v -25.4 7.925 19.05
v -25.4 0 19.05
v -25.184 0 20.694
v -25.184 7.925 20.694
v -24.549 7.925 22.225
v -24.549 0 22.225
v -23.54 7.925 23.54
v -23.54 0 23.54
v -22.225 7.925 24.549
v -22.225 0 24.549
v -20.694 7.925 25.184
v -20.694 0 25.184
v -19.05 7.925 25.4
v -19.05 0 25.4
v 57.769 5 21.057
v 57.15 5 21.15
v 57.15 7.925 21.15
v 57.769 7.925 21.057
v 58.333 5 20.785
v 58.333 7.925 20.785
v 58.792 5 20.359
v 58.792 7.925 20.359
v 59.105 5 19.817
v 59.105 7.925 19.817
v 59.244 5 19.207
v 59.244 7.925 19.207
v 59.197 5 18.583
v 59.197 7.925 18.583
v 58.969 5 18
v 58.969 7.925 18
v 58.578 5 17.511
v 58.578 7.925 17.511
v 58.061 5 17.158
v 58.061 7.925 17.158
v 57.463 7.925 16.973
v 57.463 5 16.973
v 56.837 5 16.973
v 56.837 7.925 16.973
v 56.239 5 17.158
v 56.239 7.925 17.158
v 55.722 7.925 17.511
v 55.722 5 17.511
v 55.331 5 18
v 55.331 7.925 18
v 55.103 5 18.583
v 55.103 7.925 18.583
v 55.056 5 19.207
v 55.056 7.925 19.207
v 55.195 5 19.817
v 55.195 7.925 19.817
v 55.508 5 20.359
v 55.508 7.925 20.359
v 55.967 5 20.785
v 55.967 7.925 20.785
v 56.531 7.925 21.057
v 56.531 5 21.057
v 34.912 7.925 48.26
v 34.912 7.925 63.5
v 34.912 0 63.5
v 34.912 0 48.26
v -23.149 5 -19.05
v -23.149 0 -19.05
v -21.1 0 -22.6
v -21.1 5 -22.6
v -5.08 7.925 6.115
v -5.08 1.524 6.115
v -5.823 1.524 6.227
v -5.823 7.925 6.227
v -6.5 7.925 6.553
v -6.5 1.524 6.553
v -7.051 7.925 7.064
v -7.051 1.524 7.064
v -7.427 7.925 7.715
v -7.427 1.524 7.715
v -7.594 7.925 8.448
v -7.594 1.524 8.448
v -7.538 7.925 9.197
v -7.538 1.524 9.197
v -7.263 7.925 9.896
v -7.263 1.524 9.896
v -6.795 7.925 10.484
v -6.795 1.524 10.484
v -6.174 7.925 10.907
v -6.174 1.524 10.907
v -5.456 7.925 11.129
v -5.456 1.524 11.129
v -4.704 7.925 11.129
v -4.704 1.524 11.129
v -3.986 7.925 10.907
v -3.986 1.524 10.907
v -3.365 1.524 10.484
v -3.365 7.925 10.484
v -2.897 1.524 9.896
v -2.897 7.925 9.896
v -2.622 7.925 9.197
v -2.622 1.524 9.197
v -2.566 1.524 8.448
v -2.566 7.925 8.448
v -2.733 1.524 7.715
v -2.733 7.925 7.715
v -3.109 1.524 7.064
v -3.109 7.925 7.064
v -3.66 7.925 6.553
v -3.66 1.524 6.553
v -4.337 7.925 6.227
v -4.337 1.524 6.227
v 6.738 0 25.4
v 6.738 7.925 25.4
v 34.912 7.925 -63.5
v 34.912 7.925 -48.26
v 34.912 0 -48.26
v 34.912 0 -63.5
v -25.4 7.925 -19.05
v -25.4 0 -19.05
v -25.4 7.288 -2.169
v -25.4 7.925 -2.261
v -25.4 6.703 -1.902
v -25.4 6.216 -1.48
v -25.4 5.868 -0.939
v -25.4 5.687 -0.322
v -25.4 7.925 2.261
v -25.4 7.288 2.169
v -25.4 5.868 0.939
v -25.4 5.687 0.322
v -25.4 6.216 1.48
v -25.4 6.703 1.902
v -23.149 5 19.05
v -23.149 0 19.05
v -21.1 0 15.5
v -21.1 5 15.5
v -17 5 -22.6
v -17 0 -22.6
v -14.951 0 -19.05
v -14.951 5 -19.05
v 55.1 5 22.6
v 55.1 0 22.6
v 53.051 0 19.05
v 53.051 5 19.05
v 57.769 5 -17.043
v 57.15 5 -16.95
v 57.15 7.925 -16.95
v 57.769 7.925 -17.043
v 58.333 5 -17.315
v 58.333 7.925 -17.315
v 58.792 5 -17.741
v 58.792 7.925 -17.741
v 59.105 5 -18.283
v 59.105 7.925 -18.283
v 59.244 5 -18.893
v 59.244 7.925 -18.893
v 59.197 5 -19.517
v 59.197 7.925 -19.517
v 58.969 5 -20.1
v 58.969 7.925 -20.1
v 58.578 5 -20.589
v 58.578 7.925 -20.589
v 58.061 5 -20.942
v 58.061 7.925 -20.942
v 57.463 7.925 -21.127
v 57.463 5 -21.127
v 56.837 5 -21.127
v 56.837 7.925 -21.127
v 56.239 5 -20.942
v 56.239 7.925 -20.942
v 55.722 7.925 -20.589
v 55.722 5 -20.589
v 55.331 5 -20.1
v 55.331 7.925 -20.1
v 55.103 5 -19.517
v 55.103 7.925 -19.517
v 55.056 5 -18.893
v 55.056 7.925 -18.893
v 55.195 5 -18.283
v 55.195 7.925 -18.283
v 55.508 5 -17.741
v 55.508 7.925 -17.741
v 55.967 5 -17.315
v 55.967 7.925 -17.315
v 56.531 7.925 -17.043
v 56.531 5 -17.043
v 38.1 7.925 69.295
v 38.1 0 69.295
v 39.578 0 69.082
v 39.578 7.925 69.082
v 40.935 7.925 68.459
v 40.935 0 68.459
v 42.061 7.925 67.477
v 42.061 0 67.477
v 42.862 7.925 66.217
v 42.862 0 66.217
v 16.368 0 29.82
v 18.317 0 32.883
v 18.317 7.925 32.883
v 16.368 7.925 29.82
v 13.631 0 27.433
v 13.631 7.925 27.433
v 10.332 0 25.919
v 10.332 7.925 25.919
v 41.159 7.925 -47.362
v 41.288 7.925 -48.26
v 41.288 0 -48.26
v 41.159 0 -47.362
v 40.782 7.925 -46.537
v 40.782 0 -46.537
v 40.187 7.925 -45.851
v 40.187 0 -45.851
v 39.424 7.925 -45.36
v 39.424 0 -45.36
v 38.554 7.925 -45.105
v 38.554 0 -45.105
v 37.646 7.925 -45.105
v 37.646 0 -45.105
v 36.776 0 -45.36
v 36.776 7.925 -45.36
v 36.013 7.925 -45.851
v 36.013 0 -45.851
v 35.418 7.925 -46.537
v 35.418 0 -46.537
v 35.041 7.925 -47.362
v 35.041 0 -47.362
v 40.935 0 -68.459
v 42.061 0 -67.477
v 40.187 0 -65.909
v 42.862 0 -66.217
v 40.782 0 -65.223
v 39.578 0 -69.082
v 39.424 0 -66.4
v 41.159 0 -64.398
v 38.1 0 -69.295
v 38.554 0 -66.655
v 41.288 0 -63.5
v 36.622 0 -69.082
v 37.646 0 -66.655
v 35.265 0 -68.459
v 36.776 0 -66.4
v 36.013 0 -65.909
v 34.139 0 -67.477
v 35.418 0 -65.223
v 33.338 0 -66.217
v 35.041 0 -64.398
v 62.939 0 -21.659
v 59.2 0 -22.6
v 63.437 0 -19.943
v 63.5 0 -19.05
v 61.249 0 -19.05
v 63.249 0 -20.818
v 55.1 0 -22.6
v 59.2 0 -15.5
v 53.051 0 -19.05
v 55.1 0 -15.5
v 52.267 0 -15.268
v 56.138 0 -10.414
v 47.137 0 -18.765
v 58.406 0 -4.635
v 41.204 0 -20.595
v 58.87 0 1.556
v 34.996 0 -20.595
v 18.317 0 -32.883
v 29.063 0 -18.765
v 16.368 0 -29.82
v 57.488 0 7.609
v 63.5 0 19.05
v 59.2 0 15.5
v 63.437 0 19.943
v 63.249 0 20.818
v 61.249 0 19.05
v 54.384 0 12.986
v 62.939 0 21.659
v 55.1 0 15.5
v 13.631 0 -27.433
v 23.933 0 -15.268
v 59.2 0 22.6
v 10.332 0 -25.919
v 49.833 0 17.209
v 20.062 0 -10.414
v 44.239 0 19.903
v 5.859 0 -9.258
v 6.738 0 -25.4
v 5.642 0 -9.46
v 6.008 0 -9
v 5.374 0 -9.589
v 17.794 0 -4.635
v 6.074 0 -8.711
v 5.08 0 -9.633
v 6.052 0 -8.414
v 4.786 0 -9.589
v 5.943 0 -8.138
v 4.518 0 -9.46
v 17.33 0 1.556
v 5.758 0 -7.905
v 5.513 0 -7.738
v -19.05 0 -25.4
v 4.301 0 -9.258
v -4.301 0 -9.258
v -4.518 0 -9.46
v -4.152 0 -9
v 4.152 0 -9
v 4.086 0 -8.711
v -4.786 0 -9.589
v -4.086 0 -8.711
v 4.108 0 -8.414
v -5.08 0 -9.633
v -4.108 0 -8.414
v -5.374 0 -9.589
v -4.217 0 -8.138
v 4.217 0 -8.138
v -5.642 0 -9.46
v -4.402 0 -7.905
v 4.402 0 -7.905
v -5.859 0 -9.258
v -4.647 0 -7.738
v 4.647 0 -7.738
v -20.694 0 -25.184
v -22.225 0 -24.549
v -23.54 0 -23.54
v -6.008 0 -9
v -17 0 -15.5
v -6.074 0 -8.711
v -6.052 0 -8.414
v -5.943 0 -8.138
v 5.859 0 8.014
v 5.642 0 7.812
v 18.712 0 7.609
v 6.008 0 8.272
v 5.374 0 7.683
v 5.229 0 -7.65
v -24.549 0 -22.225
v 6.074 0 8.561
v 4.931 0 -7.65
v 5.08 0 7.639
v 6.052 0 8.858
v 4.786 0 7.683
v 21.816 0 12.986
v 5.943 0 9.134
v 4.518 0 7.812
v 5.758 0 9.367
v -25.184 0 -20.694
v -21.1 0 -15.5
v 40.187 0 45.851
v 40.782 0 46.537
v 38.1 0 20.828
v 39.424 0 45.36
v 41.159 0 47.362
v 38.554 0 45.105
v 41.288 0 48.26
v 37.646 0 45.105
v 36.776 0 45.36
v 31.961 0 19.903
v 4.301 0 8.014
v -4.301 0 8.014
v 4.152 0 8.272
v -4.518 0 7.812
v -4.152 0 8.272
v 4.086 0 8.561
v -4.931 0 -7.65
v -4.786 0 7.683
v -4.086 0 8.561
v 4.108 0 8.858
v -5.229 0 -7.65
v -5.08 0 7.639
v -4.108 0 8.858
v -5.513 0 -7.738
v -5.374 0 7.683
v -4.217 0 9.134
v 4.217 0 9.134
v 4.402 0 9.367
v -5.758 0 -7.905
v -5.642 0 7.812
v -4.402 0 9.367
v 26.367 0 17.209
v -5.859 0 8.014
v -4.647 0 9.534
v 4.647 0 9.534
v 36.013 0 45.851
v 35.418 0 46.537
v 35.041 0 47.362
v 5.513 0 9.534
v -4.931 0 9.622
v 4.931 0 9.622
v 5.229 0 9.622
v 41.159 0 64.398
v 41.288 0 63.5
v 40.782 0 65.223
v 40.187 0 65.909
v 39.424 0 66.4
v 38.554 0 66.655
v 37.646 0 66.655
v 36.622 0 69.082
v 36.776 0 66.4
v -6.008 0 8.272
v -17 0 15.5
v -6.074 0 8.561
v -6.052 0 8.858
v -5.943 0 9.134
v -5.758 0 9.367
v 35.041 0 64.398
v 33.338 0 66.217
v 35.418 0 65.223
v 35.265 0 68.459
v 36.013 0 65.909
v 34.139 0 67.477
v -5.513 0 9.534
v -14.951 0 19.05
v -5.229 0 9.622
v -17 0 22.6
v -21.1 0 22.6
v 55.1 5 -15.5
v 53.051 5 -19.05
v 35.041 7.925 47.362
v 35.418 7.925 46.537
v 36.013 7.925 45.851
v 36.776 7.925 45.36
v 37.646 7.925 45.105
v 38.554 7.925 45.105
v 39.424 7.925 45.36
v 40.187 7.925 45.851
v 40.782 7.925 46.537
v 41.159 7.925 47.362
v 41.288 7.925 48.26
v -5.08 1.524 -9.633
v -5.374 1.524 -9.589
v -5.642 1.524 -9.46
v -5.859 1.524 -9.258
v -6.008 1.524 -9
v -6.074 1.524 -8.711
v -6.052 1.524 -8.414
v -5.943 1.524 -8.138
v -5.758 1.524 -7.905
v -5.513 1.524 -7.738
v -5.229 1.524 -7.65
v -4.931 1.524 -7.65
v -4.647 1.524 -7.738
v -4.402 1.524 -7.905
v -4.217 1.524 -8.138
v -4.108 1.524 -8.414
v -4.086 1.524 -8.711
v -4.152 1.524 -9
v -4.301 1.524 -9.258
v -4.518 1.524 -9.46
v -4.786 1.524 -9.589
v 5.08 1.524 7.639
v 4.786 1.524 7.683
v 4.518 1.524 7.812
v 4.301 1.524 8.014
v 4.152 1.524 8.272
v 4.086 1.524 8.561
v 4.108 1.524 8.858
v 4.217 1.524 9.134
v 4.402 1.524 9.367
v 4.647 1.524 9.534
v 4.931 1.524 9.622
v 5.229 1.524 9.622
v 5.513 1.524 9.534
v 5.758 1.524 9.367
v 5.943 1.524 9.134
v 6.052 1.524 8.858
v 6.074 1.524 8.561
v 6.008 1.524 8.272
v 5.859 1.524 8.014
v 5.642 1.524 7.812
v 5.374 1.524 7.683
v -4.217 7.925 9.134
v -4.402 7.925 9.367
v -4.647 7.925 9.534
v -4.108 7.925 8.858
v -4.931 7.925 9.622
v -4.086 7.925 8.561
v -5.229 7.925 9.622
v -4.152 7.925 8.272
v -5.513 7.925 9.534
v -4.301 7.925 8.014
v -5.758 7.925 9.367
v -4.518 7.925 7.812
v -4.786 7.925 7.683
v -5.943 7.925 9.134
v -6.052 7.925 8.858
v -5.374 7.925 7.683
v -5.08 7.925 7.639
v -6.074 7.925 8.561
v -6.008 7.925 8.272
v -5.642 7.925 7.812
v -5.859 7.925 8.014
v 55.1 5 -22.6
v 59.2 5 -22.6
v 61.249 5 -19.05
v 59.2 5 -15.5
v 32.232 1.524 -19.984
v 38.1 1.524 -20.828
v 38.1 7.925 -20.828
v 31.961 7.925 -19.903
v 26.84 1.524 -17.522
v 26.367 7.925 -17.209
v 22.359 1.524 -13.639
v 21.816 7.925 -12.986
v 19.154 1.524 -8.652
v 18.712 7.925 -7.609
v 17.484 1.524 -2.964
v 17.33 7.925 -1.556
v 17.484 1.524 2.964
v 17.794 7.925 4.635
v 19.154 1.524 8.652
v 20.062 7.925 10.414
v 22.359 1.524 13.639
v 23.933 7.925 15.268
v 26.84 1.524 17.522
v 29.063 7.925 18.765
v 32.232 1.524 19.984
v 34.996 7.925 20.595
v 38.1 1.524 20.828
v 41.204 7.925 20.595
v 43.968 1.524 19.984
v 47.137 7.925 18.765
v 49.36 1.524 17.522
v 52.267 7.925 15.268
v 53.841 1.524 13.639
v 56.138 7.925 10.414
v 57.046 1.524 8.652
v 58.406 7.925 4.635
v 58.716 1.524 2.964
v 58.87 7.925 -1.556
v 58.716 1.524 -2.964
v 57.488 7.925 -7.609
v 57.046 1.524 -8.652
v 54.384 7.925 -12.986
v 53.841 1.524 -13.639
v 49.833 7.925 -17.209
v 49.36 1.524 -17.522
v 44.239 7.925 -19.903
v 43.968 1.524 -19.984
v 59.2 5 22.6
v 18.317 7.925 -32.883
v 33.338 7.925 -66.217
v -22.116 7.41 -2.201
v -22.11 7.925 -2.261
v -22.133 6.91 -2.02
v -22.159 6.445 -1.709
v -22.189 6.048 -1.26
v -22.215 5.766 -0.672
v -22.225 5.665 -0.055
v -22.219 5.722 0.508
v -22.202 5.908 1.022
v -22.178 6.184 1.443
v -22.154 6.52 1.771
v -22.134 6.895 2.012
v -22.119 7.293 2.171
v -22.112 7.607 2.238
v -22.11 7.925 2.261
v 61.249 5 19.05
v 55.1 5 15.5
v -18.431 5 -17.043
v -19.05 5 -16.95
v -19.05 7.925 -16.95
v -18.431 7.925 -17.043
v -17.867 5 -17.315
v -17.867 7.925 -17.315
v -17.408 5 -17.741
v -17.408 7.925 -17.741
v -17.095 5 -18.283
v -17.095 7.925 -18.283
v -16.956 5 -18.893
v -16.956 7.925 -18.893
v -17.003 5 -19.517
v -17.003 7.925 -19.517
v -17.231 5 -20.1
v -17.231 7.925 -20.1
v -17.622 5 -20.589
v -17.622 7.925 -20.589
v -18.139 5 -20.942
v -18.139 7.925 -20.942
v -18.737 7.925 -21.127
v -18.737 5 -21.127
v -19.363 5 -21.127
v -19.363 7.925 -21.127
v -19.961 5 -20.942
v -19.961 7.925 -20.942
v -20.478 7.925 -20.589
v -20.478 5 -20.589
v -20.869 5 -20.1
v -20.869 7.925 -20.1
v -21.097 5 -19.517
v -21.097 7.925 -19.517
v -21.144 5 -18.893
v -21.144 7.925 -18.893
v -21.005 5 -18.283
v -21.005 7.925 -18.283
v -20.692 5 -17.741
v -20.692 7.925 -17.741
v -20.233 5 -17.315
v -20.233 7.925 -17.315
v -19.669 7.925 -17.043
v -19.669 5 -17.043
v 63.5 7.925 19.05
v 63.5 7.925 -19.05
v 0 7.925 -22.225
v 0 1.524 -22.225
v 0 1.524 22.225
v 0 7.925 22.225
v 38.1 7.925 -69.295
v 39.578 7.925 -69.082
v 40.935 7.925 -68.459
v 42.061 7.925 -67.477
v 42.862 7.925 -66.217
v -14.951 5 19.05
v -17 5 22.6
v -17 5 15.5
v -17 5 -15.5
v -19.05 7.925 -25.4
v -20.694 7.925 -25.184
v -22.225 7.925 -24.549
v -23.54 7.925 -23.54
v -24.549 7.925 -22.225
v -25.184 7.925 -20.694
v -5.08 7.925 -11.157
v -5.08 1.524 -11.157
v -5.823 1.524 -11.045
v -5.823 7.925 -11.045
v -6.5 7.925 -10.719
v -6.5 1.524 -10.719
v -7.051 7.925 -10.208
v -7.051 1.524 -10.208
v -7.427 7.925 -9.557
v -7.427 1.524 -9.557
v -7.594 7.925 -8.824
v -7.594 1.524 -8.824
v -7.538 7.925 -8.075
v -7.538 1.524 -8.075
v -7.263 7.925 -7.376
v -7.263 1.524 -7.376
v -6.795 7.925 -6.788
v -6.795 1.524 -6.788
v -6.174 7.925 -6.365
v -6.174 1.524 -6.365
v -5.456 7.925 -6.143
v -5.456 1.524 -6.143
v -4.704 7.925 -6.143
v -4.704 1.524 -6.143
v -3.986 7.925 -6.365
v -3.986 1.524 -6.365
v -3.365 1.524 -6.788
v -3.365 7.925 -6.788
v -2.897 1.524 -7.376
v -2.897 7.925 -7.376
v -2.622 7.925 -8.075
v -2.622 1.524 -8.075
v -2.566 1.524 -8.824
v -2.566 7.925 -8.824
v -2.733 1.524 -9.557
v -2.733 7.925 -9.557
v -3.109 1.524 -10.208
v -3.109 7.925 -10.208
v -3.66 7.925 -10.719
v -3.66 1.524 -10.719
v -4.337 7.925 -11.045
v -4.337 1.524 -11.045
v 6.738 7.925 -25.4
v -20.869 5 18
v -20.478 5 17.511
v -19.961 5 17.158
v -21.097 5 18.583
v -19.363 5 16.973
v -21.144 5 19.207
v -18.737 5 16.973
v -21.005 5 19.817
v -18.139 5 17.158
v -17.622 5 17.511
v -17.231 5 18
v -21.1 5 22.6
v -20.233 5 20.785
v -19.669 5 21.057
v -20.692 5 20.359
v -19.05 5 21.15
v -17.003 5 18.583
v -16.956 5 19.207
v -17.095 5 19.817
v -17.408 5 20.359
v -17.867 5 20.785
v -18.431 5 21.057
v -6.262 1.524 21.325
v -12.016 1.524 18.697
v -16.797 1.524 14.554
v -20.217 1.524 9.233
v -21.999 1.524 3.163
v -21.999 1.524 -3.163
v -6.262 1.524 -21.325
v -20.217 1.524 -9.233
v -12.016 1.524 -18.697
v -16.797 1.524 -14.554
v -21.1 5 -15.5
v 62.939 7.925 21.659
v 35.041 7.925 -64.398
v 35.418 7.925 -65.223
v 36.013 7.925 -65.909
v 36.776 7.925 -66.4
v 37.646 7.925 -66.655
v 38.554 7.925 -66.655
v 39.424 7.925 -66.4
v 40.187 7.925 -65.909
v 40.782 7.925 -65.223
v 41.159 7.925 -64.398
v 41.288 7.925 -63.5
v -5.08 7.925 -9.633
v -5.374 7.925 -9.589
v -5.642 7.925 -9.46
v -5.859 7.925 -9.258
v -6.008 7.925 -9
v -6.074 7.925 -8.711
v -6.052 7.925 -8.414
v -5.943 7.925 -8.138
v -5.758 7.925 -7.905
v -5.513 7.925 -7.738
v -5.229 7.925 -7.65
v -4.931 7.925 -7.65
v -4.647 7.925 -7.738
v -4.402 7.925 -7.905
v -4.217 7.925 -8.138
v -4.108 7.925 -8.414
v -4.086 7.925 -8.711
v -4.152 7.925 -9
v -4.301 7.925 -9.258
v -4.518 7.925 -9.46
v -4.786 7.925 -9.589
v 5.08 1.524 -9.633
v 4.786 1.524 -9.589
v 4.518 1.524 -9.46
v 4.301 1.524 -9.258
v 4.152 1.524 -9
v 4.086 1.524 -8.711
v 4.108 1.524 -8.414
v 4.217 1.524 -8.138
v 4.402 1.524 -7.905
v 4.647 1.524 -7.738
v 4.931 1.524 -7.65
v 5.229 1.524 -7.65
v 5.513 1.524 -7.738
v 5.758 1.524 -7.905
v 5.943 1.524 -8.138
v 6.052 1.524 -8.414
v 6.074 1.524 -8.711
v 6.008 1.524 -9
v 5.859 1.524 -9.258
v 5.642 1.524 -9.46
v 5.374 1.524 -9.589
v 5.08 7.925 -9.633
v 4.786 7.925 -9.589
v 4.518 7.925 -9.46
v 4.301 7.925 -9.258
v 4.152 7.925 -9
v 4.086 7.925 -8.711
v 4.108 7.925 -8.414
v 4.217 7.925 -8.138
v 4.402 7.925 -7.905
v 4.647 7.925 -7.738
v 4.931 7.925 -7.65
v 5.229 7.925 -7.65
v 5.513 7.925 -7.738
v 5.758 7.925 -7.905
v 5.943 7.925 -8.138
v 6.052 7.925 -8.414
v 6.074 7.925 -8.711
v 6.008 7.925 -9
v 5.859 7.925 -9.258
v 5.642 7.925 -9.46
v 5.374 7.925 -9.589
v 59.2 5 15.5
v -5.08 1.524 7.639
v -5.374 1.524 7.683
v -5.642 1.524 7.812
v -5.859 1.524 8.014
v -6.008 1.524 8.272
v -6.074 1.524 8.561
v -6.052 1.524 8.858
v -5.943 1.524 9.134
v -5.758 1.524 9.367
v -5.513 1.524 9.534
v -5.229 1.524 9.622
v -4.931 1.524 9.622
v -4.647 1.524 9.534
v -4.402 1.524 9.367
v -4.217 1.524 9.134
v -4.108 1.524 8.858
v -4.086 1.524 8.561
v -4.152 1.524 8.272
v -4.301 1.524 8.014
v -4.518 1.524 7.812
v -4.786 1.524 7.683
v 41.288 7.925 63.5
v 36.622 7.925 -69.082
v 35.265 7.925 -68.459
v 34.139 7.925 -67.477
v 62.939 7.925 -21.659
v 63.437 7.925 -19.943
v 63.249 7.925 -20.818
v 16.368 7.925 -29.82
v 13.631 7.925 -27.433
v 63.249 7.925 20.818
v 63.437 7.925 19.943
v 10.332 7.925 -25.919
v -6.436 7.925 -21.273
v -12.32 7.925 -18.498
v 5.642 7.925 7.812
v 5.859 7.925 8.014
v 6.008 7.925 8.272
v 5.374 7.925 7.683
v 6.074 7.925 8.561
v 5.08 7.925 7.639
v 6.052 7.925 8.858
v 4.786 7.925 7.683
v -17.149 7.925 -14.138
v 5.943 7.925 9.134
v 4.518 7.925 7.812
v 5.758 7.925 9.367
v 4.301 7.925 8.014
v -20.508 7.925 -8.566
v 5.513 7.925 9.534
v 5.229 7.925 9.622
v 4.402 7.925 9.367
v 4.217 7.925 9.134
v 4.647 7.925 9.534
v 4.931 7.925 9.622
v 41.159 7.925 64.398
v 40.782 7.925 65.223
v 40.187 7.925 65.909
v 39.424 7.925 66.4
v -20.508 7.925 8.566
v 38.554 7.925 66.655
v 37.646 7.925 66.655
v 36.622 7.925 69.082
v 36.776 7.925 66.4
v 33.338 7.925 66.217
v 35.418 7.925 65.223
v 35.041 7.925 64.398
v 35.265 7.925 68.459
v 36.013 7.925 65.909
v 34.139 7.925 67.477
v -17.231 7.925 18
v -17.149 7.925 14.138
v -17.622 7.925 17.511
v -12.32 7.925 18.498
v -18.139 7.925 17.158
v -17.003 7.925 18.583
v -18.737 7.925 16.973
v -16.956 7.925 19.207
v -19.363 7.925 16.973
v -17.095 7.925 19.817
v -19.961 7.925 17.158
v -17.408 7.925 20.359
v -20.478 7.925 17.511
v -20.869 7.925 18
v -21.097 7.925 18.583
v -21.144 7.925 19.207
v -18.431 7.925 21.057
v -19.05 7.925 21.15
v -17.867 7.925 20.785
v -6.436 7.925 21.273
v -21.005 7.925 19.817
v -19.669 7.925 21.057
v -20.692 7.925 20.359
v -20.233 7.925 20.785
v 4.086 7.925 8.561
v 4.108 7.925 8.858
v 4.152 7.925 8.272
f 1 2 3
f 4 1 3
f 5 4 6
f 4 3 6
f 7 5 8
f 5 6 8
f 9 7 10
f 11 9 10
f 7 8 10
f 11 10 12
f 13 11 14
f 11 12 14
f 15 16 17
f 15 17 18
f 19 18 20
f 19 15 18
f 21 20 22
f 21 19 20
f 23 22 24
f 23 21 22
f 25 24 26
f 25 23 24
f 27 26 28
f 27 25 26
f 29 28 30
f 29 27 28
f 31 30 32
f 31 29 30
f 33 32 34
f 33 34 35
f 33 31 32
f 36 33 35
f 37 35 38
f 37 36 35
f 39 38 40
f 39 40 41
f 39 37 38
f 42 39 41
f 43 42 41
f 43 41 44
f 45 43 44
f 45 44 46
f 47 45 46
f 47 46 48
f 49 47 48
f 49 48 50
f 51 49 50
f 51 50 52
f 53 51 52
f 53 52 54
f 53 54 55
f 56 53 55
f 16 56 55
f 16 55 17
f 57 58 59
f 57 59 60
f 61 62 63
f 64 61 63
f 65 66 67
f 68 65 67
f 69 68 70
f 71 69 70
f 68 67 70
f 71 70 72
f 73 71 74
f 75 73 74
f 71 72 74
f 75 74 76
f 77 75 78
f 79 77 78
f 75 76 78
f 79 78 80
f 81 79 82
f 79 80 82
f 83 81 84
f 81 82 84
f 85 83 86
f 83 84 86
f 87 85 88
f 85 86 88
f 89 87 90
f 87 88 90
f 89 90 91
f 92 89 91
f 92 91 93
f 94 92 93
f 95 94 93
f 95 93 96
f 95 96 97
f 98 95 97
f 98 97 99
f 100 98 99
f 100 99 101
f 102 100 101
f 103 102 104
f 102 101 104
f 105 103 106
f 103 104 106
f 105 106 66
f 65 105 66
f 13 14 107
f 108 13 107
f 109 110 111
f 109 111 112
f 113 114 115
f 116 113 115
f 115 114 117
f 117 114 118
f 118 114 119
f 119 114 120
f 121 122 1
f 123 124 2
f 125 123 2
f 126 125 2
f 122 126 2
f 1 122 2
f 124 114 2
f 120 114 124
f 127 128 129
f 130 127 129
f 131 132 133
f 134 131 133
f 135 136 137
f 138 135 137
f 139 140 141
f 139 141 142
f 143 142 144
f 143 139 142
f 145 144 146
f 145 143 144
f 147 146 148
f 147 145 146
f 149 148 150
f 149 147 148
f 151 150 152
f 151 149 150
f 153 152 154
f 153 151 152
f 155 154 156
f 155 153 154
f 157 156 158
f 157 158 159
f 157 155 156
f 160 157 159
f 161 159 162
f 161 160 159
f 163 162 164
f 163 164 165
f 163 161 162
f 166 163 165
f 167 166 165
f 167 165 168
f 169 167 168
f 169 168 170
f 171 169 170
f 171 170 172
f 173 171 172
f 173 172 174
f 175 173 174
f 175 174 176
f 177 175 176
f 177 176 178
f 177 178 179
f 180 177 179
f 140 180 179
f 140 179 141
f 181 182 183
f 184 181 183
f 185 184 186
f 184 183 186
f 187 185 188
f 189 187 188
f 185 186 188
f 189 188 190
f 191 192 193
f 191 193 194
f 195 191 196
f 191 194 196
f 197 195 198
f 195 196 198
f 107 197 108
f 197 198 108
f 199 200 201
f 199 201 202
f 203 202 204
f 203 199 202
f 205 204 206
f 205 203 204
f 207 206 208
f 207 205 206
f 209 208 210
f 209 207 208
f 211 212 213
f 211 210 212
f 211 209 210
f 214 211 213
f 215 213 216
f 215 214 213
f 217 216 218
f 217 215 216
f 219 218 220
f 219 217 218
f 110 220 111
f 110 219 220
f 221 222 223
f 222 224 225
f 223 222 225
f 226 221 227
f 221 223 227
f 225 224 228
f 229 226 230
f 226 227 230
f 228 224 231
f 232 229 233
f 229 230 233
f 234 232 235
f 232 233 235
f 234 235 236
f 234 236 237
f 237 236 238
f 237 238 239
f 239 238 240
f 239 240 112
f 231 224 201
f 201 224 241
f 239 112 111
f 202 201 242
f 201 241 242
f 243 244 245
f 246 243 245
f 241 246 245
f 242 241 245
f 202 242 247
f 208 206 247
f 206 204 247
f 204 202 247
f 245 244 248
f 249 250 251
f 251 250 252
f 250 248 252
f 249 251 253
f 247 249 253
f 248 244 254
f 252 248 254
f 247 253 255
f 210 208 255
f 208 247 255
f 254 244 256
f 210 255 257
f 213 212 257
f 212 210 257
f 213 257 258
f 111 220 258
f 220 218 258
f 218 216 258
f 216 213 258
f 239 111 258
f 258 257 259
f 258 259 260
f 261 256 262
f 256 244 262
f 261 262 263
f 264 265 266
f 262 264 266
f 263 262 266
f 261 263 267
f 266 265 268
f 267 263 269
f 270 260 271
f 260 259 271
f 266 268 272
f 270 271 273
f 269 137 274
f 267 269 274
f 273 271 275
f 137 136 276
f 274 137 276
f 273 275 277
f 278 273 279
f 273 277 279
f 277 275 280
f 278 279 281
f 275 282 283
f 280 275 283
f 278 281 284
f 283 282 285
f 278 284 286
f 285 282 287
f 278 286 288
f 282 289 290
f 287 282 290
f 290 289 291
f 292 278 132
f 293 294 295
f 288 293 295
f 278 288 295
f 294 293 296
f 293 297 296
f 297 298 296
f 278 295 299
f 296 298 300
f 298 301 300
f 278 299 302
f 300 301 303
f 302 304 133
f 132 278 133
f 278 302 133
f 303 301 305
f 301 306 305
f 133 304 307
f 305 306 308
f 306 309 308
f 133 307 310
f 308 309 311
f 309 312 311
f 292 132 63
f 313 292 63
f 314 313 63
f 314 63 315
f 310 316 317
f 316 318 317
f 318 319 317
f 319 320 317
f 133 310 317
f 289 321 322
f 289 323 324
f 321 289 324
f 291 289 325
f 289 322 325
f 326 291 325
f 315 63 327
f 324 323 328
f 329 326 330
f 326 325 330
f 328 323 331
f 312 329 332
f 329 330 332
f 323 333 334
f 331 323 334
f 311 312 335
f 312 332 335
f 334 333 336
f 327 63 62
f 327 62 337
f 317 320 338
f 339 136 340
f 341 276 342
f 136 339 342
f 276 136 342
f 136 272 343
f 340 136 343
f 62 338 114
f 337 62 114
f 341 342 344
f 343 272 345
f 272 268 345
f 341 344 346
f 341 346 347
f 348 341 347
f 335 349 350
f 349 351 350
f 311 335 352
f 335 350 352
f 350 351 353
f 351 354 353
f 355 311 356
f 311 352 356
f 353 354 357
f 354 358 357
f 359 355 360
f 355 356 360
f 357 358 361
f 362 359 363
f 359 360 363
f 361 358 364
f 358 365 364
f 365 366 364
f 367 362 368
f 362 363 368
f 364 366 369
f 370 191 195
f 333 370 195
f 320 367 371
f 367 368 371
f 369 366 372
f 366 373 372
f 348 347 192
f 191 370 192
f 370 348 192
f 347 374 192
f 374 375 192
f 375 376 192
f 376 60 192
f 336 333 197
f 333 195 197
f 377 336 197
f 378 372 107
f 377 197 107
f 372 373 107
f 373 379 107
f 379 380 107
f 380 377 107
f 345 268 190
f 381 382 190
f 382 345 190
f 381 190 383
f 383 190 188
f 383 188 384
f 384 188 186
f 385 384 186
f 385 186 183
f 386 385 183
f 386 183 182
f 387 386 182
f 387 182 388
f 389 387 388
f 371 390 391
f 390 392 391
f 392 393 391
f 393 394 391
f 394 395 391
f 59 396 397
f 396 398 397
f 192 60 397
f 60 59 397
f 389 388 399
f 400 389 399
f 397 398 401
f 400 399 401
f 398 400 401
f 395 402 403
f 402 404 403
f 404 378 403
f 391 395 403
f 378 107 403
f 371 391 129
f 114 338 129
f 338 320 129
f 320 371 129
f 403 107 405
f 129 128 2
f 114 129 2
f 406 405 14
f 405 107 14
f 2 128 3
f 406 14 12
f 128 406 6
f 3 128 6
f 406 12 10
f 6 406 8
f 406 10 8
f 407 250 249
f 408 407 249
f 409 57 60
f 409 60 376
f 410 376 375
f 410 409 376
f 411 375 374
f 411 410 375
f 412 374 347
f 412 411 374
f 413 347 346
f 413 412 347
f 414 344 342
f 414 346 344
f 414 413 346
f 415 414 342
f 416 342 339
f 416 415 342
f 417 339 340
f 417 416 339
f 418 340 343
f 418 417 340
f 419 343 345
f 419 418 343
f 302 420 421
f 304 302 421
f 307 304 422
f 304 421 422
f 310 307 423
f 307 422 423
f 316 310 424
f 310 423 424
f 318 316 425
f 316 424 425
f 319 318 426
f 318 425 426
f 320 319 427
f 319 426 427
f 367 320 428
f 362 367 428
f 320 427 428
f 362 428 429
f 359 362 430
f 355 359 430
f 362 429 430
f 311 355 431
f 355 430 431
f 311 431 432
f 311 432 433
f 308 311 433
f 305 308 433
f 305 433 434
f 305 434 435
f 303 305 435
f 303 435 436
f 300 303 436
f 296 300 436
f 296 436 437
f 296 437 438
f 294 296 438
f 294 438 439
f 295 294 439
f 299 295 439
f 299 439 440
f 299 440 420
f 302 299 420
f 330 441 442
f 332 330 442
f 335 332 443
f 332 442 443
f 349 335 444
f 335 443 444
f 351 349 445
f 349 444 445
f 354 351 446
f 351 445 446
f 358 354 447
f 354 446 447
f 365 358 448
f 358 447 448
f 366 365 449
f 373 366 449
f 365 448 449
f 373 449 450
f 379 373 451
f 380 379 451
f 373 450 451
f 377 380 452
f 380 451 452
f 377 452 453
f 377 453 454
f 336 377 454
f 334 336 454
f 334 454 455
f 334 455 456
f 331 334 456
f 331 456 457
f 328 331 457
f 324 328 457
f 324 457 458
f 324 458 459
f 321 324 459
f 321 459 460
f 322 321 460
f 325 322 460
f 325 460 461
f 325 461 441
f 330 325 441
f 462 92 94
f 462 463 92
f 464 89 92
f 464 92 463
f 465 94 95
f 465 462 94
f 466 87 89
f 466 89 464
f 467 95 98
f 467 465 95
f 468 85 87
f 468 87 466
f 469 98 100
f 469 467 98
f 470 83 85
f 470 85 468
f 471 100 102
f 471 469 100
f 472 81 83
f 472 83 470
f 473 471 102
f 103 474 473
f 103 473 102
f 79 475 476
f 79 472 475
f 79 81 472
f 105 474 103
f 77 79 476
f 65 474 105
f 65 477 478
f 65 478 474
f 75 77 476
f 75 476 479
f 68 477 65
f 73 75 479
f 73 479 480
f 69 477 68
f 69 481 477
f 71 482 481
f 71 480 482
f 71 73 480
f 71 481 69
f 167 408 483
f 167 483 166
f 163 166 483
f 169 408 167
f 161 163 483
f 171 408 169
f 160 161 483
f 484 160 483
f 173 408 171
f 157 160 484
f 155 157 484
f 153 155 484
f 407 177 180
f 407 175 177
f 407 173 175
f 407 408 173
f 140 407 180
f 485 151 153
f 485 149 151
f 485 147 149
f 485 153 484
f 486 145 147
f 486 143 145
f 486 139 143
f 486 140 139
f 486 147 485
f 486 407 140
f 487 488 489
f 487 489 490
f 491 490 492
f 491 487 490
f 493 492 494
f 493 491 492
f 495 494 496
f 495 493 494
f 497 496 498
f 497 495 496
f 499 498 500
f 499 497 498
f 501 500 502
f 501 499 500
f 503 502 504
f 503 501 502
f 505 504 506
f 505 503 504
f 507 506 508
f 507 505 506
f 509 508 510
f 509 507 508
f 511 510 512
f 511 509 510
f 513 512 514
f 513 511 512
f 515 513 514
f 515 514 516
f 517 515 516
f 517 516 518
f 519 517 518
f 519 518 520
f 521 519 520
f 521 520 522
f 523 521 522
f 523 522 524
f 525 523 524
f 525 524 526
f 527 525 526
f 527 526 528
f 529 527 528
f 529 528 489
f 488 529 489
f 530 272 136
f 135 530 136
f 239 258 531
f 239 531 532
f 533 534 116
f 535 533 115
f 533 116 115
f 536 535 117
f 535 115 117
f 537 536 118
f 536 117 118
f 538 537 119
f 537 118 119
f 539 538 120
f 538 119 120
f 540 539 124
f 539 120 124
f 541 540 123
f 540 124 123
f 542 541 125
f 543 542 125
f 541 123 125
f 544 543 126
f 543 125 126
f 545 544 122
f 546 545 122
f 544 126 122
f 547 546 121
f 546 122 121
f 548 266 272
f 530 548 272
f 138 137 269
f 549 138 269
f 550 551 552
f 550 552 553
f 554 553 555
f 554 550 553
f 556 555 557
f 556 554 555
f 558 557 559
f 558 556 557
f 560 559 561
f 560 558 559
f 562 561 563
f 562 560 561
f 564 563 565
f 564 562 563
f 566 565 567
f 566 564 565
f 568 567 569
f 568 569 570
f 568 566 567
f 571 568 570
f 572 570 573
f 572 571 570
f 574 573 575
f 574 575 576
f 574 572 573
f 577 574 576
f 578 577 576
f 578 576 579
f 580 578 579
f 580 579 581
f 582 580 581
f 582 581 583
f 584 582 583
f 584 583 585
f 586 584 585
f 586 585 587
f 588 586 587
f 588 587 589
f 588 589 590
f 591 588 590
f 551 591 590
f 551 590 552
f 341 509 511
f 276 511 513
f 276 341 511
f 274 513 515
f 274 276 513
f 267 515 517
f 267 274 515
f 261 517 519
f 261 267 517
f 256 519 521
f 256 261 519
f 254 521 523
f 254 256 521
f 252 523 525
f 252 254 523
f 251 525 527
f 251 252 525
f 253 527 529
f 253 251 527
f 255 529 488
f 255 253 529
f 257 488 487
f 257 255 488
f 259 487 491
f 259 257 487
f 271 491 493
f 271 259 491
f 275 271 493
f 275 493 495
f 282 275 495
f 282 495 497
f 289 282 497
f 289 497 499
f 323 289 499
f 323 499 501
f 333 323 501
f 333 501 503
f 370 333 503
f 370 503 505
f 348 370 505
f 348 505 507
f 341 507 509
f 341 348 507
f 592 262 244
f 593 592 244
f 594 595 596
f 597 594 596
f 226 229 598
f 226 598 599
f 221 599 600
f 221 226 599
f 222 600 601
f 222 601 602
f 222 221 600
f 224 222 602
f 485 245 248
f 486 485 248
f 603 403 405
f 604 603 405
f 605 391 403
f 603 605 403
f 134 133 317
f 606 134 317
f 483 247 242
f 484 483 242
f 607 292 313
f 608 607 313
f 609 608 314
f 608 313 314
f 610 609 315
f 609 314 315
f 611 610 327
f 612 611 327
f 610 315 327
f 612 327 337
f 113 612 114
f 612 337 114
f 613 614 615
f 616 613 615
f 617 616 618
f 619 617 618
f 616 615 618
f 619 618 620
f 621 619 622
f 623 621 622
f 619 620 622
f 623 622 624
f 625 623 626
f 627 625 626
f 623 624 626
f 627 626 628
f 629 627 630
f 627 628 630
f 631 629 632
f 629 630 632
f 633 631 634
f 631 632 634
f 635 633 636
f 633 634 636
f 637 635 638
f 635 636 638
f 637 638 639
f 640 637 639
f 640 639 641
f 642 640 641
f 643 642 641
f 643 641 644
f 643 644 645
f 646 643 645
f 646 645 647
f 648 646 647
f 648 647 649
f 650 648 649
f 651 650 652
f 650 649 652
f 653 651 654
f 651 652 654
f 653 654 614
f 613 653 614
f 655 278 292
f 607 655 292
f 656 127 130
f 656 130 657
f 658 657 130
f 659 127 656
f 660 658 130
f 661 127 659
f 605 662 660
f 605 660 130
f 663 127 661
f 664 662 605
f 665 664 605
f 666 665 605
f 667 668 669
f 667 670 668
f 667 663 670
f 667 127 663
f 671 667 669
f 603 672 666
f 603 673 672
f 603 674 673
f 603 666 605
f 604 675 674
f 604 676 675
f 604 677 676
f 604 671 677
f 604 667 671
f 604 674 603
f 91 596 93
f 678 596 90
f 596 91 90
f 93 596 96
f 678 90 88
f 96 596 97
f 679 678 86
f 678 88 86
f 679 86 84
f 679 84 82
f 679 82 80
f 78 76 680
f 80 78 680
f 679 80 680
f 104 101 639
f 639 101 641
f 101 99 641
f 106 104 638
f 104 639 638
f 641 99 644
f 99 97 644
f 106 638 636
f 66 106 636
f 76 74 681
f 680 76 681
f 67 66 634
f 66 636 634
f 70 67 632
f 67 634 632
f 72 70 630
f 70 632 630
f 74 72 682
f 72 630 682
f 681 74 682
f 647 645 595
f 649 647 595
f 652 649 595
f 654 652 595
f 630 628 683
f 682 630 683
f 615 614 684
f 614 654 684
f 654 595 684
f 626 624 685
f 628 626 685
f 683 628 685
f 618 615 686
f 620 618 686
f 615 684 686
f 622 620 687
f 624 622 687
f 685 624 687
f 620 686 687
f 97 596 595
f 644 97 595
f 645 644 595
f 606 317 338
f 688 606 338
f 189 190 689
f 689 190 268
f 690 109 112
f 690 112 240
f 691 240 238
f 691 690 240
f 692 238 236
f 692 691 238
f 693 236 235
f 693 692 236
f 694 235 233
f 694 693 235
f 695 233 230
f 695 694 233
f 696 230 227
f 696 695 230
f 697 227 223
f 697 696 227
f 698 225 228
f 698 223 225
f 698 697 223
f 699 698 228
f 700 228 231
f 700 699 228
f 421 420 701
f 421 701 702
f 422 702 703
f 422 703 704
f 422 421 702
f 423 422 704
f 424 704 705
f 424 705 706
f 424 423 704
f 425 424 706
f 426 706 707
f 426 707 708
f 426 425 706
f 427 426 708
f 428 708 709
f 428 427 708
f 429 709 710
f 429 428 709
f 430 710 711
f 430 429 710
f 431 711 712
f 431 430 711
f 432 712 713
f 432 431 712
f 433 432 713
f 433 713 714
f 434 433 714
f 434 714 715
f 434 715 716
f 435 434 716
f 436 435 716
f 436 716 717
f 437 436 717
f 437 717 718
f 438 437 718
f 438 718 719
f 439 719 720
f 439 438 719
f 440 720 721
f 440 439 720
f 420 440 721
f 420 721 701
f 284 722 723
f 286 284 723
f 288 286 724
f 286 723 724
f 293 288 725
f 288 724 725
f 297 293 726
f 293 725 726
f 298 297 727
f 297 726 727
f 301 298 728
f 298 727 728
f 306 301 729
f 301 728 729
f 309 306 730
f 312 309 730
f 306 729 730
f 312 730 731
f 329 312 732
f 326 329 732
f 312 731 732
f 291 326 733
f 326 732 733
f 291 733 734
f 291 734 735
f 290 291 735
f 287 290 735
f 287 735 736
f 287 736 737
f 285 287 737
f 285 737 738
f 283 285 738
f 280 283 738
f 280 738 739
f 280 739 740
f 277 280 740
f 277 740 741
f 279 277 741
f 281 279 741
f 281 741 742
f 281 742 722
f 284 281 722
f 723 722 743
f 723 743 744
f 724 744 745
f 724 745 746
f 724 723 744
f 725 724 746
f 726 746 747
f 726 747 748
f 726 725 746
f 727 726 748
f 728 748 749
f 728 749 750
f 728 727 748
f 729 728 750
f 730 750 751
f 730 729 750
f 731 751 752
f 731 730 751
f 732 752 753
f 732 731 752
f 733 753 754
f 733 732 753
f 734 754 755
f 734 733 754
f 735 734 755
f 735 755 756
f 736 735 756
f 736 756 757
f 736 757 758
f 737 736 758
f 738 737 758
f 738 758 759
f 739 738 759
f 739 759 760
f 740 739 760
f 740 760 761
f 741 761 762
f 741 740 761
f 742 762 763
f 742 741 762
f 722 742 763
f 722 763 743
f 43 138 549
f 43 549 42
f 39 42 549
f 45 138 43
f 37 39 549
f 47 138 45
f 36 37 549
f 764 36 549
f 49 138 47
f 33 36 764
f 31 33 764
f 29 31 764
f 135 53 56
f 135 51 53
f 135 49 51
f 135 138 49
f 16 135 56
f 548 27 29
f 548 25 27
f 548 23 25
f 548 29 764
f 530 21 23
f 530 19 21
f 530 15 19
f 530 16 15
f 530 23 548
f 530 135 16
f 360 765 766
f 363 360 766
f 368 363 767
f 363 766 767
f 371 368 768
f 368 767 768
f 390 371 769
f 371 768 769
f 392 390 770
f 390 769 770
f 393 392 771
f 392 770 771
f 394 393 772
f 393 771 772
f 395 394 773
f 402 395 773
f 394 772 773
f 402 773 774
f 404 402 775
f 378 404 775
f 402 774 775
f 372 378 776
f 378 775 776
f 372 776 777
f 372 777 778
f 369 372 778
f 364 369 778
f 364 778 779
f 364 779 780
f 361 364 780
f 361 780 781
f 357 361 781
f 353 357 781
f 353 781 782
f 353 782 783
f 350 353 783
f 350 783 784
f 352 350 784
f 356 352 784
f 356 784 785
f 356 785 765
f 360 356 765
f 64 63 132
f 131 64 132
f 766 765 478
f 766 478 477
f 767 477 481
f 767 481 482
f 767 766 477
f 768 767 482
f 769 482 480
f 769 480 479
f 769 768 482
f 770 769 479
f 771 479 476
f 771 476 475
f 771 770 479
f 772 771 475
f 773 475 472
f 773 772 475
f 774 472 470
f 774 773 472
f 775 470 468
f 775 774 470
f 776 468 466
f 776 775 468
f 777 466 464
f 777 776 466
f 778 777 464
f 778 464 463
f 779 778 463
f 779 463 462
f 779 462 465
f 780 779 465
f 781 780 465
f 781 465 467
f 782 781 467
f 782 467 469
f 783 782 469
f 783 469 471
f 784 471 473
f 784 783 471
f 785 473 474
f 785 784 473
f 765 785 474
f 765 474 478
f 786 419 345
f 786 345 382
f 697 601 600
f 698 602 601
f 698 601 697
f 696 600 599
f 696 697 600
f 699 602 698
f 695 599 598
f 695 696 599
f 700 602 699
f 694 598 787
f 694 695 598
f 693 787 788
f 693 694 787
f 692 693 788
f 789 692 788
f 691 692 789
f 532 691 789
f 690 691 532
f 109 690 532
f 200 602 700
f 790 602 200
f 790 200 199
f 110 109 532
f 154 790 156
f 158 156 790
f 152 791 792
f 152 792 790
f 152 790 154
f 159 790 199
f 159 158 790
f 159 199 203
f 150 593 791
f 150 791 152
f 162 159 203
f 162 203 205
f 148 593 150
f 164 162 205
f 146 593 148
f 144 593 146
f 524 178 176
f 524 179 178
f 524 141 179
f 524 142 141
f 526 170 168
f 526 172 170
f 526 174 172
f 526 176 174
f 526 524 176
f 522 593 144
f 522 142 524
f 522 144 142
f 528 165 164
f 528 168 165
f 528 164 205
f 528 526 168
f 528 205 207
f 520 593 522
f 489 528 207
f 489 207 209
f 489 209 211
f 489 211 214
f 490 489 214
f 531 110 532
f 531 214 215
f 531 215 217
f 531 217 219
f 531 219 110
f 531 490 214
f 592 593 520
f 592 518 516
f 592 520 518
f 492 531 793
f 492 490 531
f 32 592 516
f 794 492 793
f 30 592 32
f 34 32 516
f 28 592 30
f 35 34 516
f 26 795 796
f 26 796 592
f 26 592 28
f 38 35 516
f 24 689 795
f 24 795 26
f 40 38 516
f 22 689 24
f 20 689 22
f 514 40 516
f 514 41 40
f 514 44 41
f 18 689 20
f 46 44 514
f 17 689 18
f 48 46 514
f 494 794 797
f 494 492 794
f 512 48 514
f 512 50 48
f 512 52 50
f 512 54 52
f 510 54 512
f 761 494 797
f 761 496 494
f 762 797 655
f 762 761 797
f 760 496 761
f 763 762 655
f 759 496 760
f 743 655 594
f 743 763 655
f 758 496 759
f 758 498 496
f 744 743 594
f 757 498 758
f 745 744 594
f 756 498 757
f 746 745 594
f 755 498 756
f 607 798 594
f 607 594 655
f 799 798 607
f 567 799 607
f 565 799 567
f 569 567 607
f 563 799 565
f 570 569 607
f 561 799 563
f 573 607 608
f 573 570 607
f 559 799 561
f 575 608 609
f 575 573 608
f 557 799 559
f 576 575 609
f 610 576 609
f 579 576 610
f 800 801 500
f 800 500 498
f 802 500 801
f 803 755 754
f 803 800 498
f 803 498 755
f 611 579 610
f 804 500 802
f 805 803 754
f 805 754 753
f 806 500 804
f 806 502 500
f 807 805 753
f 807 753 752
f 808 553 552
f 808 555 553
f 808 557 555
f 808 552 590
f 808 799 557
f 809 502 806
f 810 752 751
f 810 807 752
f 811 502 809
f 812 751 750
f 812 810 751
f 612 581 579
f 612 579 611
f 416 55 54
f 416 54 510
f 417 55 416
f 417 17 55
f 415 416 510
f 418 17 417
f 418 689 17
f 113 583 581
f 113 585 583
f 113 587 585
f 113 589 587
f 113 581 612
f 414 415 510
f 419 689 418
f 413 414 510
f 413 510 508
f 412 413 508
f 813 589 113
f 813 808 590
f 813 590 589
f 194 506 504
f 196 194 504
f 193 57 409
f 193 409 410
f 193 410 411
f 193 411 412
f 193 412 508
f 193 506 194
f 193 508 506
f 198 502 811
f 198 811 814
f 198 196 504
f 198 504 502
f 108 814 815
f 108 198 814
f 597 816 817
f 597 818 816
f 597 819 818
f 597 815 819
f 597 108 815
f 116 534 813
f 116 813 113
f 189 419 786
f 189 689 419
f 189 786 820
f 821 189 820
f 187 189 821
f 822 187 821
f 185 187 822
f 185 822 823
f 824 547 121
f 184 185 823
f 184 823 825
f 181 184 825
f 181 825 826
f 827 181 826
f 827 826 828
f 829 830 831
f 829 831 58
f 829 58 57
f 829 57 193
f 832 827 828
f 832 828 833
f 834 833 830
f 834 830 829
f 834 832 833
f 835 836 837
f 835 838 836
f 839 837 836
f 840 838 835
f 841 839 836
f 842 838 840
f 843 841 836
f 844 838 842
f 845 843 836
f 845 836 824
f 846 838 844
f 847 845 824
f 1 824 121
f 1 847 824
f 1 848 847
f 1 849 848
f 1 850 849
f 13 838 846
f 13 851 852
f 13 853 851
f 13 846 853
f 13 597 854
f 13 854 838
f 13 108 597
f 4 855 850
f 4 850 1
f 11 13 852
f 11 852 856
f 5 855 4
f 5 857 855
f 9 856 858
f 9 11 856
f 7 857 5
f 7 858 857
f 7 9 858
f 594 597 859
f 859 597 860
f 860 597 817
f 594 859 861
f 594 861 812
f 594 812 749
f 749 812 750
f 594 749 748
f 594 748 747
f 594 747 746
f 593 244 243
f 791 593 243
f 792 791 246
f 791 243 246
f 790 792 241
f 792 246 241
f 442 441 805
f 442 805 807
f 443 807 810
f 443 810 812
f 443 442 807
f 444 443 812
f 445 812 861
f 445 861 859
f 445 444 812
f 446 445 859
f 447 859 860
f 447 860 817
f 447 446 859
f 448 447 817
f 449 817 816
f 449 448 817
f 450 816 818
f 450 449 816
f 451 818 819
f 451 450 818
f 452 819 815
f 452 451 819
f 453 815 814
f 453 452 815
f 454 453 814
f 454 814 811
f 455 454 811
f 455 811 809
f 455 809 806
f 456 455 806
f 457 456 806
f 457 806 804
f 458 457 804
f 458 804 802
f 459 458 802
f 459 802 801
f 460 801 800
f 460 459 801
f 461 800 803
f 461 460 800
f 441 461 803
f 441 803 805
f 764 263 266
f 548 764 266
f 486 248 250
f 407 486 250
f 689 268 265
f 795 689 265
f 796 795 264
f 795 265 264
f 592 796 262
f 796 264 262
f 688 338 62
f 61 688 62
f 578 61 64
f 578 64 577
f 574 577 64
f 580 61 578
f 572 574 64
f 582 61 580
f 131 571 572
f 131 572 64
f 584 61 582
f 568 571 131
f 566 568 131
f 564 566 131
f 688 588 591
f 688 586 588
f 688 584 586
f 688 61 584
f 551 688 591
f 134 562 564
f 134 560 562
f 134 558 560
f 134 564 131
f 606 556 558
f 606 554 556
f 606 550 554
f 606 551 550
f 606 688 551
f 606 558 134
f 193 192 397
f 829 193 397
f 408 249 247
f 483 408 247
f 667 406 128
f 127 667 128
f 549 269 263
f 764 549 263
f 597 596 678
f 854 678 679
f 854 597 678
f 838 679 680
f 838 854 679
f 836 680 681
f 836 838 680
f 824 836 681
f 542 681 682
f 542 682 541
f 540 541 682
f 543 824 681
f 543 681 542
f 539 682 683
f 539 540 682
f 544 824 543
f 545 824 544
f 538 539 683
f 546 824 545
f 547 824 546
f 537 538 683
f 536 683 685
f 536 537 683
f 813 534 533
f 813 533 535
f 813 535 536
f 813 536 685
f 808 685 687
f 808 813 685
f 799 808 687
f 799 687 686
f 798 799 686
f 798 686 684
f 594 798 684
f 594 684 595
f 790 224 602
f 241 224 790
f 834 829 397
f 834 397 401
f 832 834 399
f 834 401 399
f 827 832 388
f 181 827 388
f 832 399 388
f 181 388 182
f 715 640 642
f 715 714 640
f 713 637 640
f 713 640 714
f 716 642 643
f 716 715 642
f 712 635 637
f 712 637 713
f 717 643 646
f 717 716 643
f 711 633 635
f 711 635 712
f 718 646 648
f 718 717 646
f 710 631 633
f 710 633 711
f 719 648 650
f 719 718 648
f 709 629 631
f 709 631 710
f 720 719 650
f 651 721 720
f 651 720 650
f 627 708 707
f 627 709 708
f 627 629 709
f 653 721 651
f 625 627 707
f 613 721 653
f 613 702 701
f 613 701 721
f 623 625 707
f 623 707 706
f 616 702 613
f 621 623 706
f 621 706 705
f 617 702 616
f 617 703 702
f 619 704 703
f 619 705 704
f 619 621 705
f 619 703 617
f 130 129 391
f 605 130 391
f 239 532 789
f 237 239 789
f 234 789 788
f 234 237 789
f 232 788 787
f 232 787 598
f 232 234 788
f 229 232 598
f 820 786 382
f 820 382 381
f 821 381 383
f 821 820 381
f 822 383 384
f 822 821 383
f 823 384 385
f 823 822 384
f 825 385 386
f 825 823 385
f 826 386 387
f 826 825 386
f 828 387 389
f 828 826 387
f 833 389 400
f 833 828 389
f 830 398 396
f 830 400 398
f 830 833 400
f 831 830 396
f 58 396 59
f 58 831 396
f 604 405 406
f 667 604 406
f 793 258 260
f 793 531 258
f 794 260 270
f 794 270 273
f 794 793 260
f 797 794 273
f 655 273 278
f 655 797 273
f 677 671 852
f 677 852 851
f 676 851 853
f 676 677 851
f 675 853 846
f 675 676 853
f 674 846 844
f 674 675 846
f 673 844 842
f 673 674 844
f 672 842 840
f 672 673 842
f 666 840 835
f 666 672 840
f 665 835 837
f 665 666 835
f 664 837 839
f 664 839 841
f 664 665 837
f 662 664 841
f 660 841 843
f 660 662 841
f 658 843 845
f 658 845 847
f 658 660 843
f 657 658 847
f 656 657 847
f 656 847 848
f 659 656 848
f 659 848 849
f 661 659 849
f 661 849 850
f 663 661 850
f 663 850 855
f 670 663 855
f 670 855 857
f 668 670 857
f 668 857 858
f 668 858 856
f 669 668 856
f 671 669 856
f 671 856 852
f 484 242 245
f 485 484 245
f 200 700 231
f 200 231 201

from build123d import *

# Parameters (mm, degrees)
SKETCH1_R               = 20.828
SKETCH1_R_2             = 2.1
BOSS_EXTRUDE1_DEPTH     = 7.9248
CUT_EXTRUDE1_DEPTH      = 6.4008
SKETCH3_R               = 2.52095
SKETCH3_R_2             = 0.99695
BOSS_EXTRUDE2_DEPTH     = 6.4008
SKETCH4_R               = 0.99695
CUT_EXTRUDE2_DEPTH      = 69.690466883
SKETCH5_R               = 20.828
SKETCH5_R_2             = 0.99695
BOSS_EXTRUDE3_DEPTH     = 6.4008
BOSS_EXTRUDE4_DEPTH     = 7.9248
CUT_EXTRUDE3_REACH      = 114.995
CUT_EXTRUDE3_END_RADIUS = 22.225
SKETCH7_R               = 2.2606
CUT_EXTRUDE4_DEPTH      = 5
FILLET1_R               = 12.7
CUT_EXTRUDE5_DEPTH      = 60.706


with BuildPart() as part:
    # Sketch1 → Boss-Extrude1 (new body)
    with BuildSketch(Plane(origin=(0, 0, 0), x_dir=(1, 0, 0), z_dir=(0, 1, 0))):
        with BuildLine():
            Line((-19.05, -25.4), (57.15, -25.4))
            ThreePointArc((57.15, -25.4), (61.640128061, -23.540128061), (63.5, -19.05))
            Line((63.5, -19.05), (63.5, 19.05))
            ThreePointArc((63.5, 19.05), (61.640128061, 23.540128061), (57.15, 25.4))
            Line((57.15, 25.4), (-19.05, 25.4))
            ThreePointArc((-19.05, 25.4), (-23.540128061, 23.540128061), (-25.4, 19.05))
            Line((-25.4, 19.05), (-25.4, -19.05))
            ThreePointArc((-25.4, -19.05), (-23.540128061, -23.540128061), (-19.05, -25.4))
        make_face()
        with Locations(Location((38.1, 0, 0), (0, 0, 270))):
            Circle(SKETCH1_R, mode=Mode.SUBTRACT)
        with Locations(Location((-19.05, 19.05, 0), (0, 0, 270))):
            Circle(SKETCH1_R_2, mode=Mode.SUBTRACT)
        with Locations(Location((-19.05, -19.05, 0), (0, 0, 270))):
            Circle(SKETCH1_R_2, mode=Mode.SUBTRACT)
        with Locations(Location((57.15, -19.05, 0), (0, 0, 270))):
            Circle(SKETCH1_R_2, mode=Mode.SUBTRACT)
        with Locations(Location((57.15, 19.05, 0), (0, 0, 270))):
            Circle(SKETCH1_R_2, mode=Mode.SUBTRACT)
    extrude(amount=BOSS_EXTRUDE1_DEPTH)

    # Sketch2 → Cut-Extrude1 (cut)
    with BuildSketch(Plane(origin=(0, 7.9248, 0), x_dir=(1, 0, 0), z_dir=(0, 1, 0))):
        with BuildLine():
            Line((0, 22.225), (38.1, 22.225))
            ThreePointArc((38.1, 22.225), (60.325, 0), (38.1, -22.225))
            Line((38.1, -22.225), (0, -22.225))
            ThreePointArc((0, -22.225), (-22.225, 0), (0, 22.225))
        make_face()
    extrude(amount=-CUT_EXTRUDE1_DEPTH, mode=Mode.SUBTRACT)

    # Sketch3 → Boss-Extrude2 (add)
    # profile 1 of 4: a face of its own
    with BuildSketch(Plane(origin=(0, 1.524, 0), x_dir=(1, 0, 0), z_dir=(0, 1, 0))):
        with Locations(Location((-5.08, 8.636, 0), (0, 0, 90))):
            Circle(SKETCH3_R)
        with Locations(Location((-5.08, 8.636, 0), (0, 0, 90))):
            Circle(SKETCH3_R_2, mode=Mode.SUBTRACT)
    # profile 2 of 4: a face of its own
    with BuildSketch(Plane(origin=(0, 1.524, 0), x_dir=(1, 0, 0), z_dir=(0, 1, 0))):
        with Locations(Location((5.08, 8.636, 0), (0, 0, 90))):
            Circle(SKETCH3_R)
        with Locations(Location((5.08, 8.636, 0), (0, 0, 90))):
            Circle(SKETCH3_R_2, mode=Mode.SUBTRACT)
    # profile 3 of 4: a face of its own
    with BuildSketch(Plane(origin=(0, 1.524, 0), x_dir=(1, 0, 0), z_dir=(0, 1, 0))):
        with Locations(Location((5.08, -8.636, 0), (0, 0, 90))):
            Circle(SKETCH3_R)
        with Locations(Location((5.08, -8.636, 0), (0, 0, 90))):
            Circle(SKETCH3_R_2, mode=Mode.SUBTRACT)
    # profile 4 of 4: a face of its own
    with BuildSketch(Plane(origin=(0, 1.524, 0), x_dir=(1, 0, 0), z_dir=(0, 1, 0))):
        with Locations(Location((-5.08, -8.636, 0), (0, 0, 90))):
            Circle(SKETCH3_R)
        with Locations(Location((-5.08, -8.636, 0), (0, 0, 90))):
            Circle(SKETCH3_R_2, mode=Mode.SUBTRACT)
    extrude(amount=BOSS_EXTRUDE2_DEPTH)

    # Sketch4 → Cut-Extrude2 (cut, through all)
    with BuildSketch(Plane(origin=(0, 1.524, 0), x_dir=(1, 0, 0), z_dir=(0, 1, 0))):
        with Locations(Location((5.08, -8.636, 0), (0, 0, 90))):
            Circle(SKETCH4_R)
        with Locations(Location((-5.08, -8.636, 0), (0, 0, 90))):
            Circle(SKETCH4_R)
        with Locations(Location((5.08, 8.636, 0), (0, 0, 90))):
            Circle(SKETCH4_R)
        with Locations(Location((-5.08, 8.636, 0), (0, 0, 90))):
            Circle(SKETCH4_R)
    extrude(amount=-CUT_EXTRUDE2_DEPTH, mode=Mode.SUBTRACT)

    # Sketch5 → Boss-Extrude3 (add)
    with BuildSketch(Plane(origin=(0, 1.524, 0), x_dir=(1, 0, 0), z_dir=(0, 1, 0))):
        with BuildLine():
            Line((0, 22.225), (0, -22.225))
            Line((0, -22.225), (38.1, -22.225))
            ThreePointArc((38.1, -22.225), (60.325, 0), (38.1, 22.225))
            Line((38.1, 22.225), (0, 22.225))
        make_face()
        with Locations(Location((38.1, 0, 0), (0, 0, 90))):
            Circle(SKETCH5_R, mode=Mode.SUBTRACT)
        with Locations(Location((5.08, -8.636, 0), (0, 0, 90))):
            Circle(SKETCH5_R_2, mode=Mode.SUBTRACT)
        with Locations(Location((5.08, 8.636, 0), (0, 0, 90))):
            Circle(SKETCH5_R_2, mode=Mode.SUBTRACT)
    extrude(amount=BOSS_EXTRUDE3_DEPTH)

    # Sketch6 → Boss-Extrude4 (add)
    with BuildSketch(Plane.XZ):
        with BuildLine():
            Line((42.8625, 66.217346987), (62.939460474, 21.658571912))
            ThreePointArc((62.939460474, 21.658571912), (60.596597479, 24.383241587), (57.15, 25.4))
            Line((57.15, 25.4), (14.945483896, 25.4))
            Line((14.945483896, 25.4), (33.3375, 66.217346987))
            ThreePointArc((33.3375, 66.217346987), (35.264775446, 68.45870253), (38.1, 69.295103774))
            ThreePointArc((38.1, 69.295103774), (40.935224554, 68.45870253), (42.8625, 66.217346987))
        make_face()
        with BuildLine():
            Line((57.15, -25.4), (14.945483896, -25.4))
            Line((14.945483896, -25.4), (33.3375, -66.217346987))
            ThreePointArc((33.3375, -66.217346987), (35.264775446, -68.45870253), (38.1, -69.295103774))
            ThreePointArc((38.1, -69.295103774), (40.935224554, -68.45870253), (42.8625, -66.217346987))
            Line((42.8625, -66.217346987), (62.939460474, -21.658571912))
            ThreePointArc((62.939460474, -21.658571912), (60.596597479, -24.383241587), (57.15, -25.4))
        make_face()
    extrude(amount=-BOSS_EXTRUDE4_DEPTH)

    # Cut-Extrude3: up to this cylinder (the profile starts outside it)
    cut_extrude3_end = Plane(origin=(0, 7.9248, 0), z_dir=(0, 1, 0)) * Cylinder(CUT_EXTRUDE3_END_RADIUS, 275.44, mode=Mode.PRIVATE)
    # Sketch7 → Cut-Extrude3 (cut, up to the surface)
    with BuildSketch(Plane.ZY.offset(25.4), mode=Mode.PRIVATE) as cut_extrude3_sk1:
        with Locations((0, 7.9248)):
            Circle(SKETCH7_R)
    cut_extrude3_tool1 = extrude(cut_extrude3_sk1.sketch, amount=-CUT_EXTRUDE3_REACH, mode=Mode.PRIVATE) - cut_extrude3_end
    add(cut_extrude3_tool1.solids().sort_by_distance((-25.4, 7.9248, 0))[0], mode=Mode.SUBTRACT)

    # Sketch8 → Cut-Extrude4 (cut)
    with BuildSketch(Plane.XZ):
        Polygon((-17.000406544, 22.6), (-21.099593456, 22.6), (-23.149186911, 19.05), (-21.099593456, 15.5), (-17.000406544, 15.5), (-14.950813089, 19.05), align=None)
        Polygon((-17.000406544, -15.5), (-21.099593456, -15.5), (-23.149186911, -19.05), (-21.099593456, -22.6), (-17.000406544, -22.6), (-14.950813089, -19.05), align=None)
        Polygon((59.199593456, -15.5), (55.100406544, -15.5), (53.050813089, -19.05), (55.100406544, -22.6), (59.199593456, -22.6), (61.249186911, -19.05), align=None)
        Polygon((59.199593456, 22.6), (55.100406544, 22.6), (53.050813089, 19.05), (55.100406544, 15.5), (59.199593456, 15.5), (61.249186911, 19.05), align=None)
    extrude(amount=-CUT_EXTRUDE4_DEPTH, mode=Mode.SUBTRACT)

    # Fillet1
    fillet1_edges = [part.edges().sort_by_distance(p)[0] for p in [
        (14.945483896, 3.9624, 25.4),
        (14.945483896, 3.9624, -25.4),
    ]]
    fillet(fillet1_edges, radius=FILLET1_R)

    # Sketch9 → Cut-Extrude5 (cut)
    with BuildSketch(Plane(origin=(0, 7.9248, 0), x_dir=(1, 0, 0), z_dir=(0, 1, 0))):
        with BuildLine():
            Line((34.9123, -63.5), (34.9123, -48.26))
            ThreePointArc((34.9123, -48.26), (38.1, -45.0723), (41.2877, -48.26))
            Line((41.2877, -48.26), (41.2877, -63.5))
            ThreePointArc((41.2877, -63.5), (38.1, -66.6877), (34.9123, -63.5))
        make_face()
        with BuildLine():
            Line((41.2877, 63.5), (41.2877, 48.26))
            ThreePointArc((41.2877, 48.26), (38.1, 45.0723), (34.9123, 48.26))
            Line((34.9123, 48.26), (34.9123, 63.5))
            ThreePointArc((34.9123, 63.5), (38.1, 66.6877), (41.2877, 63.5))
        make_face()
    extrude(amount=-CUT_EXTRUDE5_DEPTH, mode=Mode.SUBTRACT)


solid = part.part
